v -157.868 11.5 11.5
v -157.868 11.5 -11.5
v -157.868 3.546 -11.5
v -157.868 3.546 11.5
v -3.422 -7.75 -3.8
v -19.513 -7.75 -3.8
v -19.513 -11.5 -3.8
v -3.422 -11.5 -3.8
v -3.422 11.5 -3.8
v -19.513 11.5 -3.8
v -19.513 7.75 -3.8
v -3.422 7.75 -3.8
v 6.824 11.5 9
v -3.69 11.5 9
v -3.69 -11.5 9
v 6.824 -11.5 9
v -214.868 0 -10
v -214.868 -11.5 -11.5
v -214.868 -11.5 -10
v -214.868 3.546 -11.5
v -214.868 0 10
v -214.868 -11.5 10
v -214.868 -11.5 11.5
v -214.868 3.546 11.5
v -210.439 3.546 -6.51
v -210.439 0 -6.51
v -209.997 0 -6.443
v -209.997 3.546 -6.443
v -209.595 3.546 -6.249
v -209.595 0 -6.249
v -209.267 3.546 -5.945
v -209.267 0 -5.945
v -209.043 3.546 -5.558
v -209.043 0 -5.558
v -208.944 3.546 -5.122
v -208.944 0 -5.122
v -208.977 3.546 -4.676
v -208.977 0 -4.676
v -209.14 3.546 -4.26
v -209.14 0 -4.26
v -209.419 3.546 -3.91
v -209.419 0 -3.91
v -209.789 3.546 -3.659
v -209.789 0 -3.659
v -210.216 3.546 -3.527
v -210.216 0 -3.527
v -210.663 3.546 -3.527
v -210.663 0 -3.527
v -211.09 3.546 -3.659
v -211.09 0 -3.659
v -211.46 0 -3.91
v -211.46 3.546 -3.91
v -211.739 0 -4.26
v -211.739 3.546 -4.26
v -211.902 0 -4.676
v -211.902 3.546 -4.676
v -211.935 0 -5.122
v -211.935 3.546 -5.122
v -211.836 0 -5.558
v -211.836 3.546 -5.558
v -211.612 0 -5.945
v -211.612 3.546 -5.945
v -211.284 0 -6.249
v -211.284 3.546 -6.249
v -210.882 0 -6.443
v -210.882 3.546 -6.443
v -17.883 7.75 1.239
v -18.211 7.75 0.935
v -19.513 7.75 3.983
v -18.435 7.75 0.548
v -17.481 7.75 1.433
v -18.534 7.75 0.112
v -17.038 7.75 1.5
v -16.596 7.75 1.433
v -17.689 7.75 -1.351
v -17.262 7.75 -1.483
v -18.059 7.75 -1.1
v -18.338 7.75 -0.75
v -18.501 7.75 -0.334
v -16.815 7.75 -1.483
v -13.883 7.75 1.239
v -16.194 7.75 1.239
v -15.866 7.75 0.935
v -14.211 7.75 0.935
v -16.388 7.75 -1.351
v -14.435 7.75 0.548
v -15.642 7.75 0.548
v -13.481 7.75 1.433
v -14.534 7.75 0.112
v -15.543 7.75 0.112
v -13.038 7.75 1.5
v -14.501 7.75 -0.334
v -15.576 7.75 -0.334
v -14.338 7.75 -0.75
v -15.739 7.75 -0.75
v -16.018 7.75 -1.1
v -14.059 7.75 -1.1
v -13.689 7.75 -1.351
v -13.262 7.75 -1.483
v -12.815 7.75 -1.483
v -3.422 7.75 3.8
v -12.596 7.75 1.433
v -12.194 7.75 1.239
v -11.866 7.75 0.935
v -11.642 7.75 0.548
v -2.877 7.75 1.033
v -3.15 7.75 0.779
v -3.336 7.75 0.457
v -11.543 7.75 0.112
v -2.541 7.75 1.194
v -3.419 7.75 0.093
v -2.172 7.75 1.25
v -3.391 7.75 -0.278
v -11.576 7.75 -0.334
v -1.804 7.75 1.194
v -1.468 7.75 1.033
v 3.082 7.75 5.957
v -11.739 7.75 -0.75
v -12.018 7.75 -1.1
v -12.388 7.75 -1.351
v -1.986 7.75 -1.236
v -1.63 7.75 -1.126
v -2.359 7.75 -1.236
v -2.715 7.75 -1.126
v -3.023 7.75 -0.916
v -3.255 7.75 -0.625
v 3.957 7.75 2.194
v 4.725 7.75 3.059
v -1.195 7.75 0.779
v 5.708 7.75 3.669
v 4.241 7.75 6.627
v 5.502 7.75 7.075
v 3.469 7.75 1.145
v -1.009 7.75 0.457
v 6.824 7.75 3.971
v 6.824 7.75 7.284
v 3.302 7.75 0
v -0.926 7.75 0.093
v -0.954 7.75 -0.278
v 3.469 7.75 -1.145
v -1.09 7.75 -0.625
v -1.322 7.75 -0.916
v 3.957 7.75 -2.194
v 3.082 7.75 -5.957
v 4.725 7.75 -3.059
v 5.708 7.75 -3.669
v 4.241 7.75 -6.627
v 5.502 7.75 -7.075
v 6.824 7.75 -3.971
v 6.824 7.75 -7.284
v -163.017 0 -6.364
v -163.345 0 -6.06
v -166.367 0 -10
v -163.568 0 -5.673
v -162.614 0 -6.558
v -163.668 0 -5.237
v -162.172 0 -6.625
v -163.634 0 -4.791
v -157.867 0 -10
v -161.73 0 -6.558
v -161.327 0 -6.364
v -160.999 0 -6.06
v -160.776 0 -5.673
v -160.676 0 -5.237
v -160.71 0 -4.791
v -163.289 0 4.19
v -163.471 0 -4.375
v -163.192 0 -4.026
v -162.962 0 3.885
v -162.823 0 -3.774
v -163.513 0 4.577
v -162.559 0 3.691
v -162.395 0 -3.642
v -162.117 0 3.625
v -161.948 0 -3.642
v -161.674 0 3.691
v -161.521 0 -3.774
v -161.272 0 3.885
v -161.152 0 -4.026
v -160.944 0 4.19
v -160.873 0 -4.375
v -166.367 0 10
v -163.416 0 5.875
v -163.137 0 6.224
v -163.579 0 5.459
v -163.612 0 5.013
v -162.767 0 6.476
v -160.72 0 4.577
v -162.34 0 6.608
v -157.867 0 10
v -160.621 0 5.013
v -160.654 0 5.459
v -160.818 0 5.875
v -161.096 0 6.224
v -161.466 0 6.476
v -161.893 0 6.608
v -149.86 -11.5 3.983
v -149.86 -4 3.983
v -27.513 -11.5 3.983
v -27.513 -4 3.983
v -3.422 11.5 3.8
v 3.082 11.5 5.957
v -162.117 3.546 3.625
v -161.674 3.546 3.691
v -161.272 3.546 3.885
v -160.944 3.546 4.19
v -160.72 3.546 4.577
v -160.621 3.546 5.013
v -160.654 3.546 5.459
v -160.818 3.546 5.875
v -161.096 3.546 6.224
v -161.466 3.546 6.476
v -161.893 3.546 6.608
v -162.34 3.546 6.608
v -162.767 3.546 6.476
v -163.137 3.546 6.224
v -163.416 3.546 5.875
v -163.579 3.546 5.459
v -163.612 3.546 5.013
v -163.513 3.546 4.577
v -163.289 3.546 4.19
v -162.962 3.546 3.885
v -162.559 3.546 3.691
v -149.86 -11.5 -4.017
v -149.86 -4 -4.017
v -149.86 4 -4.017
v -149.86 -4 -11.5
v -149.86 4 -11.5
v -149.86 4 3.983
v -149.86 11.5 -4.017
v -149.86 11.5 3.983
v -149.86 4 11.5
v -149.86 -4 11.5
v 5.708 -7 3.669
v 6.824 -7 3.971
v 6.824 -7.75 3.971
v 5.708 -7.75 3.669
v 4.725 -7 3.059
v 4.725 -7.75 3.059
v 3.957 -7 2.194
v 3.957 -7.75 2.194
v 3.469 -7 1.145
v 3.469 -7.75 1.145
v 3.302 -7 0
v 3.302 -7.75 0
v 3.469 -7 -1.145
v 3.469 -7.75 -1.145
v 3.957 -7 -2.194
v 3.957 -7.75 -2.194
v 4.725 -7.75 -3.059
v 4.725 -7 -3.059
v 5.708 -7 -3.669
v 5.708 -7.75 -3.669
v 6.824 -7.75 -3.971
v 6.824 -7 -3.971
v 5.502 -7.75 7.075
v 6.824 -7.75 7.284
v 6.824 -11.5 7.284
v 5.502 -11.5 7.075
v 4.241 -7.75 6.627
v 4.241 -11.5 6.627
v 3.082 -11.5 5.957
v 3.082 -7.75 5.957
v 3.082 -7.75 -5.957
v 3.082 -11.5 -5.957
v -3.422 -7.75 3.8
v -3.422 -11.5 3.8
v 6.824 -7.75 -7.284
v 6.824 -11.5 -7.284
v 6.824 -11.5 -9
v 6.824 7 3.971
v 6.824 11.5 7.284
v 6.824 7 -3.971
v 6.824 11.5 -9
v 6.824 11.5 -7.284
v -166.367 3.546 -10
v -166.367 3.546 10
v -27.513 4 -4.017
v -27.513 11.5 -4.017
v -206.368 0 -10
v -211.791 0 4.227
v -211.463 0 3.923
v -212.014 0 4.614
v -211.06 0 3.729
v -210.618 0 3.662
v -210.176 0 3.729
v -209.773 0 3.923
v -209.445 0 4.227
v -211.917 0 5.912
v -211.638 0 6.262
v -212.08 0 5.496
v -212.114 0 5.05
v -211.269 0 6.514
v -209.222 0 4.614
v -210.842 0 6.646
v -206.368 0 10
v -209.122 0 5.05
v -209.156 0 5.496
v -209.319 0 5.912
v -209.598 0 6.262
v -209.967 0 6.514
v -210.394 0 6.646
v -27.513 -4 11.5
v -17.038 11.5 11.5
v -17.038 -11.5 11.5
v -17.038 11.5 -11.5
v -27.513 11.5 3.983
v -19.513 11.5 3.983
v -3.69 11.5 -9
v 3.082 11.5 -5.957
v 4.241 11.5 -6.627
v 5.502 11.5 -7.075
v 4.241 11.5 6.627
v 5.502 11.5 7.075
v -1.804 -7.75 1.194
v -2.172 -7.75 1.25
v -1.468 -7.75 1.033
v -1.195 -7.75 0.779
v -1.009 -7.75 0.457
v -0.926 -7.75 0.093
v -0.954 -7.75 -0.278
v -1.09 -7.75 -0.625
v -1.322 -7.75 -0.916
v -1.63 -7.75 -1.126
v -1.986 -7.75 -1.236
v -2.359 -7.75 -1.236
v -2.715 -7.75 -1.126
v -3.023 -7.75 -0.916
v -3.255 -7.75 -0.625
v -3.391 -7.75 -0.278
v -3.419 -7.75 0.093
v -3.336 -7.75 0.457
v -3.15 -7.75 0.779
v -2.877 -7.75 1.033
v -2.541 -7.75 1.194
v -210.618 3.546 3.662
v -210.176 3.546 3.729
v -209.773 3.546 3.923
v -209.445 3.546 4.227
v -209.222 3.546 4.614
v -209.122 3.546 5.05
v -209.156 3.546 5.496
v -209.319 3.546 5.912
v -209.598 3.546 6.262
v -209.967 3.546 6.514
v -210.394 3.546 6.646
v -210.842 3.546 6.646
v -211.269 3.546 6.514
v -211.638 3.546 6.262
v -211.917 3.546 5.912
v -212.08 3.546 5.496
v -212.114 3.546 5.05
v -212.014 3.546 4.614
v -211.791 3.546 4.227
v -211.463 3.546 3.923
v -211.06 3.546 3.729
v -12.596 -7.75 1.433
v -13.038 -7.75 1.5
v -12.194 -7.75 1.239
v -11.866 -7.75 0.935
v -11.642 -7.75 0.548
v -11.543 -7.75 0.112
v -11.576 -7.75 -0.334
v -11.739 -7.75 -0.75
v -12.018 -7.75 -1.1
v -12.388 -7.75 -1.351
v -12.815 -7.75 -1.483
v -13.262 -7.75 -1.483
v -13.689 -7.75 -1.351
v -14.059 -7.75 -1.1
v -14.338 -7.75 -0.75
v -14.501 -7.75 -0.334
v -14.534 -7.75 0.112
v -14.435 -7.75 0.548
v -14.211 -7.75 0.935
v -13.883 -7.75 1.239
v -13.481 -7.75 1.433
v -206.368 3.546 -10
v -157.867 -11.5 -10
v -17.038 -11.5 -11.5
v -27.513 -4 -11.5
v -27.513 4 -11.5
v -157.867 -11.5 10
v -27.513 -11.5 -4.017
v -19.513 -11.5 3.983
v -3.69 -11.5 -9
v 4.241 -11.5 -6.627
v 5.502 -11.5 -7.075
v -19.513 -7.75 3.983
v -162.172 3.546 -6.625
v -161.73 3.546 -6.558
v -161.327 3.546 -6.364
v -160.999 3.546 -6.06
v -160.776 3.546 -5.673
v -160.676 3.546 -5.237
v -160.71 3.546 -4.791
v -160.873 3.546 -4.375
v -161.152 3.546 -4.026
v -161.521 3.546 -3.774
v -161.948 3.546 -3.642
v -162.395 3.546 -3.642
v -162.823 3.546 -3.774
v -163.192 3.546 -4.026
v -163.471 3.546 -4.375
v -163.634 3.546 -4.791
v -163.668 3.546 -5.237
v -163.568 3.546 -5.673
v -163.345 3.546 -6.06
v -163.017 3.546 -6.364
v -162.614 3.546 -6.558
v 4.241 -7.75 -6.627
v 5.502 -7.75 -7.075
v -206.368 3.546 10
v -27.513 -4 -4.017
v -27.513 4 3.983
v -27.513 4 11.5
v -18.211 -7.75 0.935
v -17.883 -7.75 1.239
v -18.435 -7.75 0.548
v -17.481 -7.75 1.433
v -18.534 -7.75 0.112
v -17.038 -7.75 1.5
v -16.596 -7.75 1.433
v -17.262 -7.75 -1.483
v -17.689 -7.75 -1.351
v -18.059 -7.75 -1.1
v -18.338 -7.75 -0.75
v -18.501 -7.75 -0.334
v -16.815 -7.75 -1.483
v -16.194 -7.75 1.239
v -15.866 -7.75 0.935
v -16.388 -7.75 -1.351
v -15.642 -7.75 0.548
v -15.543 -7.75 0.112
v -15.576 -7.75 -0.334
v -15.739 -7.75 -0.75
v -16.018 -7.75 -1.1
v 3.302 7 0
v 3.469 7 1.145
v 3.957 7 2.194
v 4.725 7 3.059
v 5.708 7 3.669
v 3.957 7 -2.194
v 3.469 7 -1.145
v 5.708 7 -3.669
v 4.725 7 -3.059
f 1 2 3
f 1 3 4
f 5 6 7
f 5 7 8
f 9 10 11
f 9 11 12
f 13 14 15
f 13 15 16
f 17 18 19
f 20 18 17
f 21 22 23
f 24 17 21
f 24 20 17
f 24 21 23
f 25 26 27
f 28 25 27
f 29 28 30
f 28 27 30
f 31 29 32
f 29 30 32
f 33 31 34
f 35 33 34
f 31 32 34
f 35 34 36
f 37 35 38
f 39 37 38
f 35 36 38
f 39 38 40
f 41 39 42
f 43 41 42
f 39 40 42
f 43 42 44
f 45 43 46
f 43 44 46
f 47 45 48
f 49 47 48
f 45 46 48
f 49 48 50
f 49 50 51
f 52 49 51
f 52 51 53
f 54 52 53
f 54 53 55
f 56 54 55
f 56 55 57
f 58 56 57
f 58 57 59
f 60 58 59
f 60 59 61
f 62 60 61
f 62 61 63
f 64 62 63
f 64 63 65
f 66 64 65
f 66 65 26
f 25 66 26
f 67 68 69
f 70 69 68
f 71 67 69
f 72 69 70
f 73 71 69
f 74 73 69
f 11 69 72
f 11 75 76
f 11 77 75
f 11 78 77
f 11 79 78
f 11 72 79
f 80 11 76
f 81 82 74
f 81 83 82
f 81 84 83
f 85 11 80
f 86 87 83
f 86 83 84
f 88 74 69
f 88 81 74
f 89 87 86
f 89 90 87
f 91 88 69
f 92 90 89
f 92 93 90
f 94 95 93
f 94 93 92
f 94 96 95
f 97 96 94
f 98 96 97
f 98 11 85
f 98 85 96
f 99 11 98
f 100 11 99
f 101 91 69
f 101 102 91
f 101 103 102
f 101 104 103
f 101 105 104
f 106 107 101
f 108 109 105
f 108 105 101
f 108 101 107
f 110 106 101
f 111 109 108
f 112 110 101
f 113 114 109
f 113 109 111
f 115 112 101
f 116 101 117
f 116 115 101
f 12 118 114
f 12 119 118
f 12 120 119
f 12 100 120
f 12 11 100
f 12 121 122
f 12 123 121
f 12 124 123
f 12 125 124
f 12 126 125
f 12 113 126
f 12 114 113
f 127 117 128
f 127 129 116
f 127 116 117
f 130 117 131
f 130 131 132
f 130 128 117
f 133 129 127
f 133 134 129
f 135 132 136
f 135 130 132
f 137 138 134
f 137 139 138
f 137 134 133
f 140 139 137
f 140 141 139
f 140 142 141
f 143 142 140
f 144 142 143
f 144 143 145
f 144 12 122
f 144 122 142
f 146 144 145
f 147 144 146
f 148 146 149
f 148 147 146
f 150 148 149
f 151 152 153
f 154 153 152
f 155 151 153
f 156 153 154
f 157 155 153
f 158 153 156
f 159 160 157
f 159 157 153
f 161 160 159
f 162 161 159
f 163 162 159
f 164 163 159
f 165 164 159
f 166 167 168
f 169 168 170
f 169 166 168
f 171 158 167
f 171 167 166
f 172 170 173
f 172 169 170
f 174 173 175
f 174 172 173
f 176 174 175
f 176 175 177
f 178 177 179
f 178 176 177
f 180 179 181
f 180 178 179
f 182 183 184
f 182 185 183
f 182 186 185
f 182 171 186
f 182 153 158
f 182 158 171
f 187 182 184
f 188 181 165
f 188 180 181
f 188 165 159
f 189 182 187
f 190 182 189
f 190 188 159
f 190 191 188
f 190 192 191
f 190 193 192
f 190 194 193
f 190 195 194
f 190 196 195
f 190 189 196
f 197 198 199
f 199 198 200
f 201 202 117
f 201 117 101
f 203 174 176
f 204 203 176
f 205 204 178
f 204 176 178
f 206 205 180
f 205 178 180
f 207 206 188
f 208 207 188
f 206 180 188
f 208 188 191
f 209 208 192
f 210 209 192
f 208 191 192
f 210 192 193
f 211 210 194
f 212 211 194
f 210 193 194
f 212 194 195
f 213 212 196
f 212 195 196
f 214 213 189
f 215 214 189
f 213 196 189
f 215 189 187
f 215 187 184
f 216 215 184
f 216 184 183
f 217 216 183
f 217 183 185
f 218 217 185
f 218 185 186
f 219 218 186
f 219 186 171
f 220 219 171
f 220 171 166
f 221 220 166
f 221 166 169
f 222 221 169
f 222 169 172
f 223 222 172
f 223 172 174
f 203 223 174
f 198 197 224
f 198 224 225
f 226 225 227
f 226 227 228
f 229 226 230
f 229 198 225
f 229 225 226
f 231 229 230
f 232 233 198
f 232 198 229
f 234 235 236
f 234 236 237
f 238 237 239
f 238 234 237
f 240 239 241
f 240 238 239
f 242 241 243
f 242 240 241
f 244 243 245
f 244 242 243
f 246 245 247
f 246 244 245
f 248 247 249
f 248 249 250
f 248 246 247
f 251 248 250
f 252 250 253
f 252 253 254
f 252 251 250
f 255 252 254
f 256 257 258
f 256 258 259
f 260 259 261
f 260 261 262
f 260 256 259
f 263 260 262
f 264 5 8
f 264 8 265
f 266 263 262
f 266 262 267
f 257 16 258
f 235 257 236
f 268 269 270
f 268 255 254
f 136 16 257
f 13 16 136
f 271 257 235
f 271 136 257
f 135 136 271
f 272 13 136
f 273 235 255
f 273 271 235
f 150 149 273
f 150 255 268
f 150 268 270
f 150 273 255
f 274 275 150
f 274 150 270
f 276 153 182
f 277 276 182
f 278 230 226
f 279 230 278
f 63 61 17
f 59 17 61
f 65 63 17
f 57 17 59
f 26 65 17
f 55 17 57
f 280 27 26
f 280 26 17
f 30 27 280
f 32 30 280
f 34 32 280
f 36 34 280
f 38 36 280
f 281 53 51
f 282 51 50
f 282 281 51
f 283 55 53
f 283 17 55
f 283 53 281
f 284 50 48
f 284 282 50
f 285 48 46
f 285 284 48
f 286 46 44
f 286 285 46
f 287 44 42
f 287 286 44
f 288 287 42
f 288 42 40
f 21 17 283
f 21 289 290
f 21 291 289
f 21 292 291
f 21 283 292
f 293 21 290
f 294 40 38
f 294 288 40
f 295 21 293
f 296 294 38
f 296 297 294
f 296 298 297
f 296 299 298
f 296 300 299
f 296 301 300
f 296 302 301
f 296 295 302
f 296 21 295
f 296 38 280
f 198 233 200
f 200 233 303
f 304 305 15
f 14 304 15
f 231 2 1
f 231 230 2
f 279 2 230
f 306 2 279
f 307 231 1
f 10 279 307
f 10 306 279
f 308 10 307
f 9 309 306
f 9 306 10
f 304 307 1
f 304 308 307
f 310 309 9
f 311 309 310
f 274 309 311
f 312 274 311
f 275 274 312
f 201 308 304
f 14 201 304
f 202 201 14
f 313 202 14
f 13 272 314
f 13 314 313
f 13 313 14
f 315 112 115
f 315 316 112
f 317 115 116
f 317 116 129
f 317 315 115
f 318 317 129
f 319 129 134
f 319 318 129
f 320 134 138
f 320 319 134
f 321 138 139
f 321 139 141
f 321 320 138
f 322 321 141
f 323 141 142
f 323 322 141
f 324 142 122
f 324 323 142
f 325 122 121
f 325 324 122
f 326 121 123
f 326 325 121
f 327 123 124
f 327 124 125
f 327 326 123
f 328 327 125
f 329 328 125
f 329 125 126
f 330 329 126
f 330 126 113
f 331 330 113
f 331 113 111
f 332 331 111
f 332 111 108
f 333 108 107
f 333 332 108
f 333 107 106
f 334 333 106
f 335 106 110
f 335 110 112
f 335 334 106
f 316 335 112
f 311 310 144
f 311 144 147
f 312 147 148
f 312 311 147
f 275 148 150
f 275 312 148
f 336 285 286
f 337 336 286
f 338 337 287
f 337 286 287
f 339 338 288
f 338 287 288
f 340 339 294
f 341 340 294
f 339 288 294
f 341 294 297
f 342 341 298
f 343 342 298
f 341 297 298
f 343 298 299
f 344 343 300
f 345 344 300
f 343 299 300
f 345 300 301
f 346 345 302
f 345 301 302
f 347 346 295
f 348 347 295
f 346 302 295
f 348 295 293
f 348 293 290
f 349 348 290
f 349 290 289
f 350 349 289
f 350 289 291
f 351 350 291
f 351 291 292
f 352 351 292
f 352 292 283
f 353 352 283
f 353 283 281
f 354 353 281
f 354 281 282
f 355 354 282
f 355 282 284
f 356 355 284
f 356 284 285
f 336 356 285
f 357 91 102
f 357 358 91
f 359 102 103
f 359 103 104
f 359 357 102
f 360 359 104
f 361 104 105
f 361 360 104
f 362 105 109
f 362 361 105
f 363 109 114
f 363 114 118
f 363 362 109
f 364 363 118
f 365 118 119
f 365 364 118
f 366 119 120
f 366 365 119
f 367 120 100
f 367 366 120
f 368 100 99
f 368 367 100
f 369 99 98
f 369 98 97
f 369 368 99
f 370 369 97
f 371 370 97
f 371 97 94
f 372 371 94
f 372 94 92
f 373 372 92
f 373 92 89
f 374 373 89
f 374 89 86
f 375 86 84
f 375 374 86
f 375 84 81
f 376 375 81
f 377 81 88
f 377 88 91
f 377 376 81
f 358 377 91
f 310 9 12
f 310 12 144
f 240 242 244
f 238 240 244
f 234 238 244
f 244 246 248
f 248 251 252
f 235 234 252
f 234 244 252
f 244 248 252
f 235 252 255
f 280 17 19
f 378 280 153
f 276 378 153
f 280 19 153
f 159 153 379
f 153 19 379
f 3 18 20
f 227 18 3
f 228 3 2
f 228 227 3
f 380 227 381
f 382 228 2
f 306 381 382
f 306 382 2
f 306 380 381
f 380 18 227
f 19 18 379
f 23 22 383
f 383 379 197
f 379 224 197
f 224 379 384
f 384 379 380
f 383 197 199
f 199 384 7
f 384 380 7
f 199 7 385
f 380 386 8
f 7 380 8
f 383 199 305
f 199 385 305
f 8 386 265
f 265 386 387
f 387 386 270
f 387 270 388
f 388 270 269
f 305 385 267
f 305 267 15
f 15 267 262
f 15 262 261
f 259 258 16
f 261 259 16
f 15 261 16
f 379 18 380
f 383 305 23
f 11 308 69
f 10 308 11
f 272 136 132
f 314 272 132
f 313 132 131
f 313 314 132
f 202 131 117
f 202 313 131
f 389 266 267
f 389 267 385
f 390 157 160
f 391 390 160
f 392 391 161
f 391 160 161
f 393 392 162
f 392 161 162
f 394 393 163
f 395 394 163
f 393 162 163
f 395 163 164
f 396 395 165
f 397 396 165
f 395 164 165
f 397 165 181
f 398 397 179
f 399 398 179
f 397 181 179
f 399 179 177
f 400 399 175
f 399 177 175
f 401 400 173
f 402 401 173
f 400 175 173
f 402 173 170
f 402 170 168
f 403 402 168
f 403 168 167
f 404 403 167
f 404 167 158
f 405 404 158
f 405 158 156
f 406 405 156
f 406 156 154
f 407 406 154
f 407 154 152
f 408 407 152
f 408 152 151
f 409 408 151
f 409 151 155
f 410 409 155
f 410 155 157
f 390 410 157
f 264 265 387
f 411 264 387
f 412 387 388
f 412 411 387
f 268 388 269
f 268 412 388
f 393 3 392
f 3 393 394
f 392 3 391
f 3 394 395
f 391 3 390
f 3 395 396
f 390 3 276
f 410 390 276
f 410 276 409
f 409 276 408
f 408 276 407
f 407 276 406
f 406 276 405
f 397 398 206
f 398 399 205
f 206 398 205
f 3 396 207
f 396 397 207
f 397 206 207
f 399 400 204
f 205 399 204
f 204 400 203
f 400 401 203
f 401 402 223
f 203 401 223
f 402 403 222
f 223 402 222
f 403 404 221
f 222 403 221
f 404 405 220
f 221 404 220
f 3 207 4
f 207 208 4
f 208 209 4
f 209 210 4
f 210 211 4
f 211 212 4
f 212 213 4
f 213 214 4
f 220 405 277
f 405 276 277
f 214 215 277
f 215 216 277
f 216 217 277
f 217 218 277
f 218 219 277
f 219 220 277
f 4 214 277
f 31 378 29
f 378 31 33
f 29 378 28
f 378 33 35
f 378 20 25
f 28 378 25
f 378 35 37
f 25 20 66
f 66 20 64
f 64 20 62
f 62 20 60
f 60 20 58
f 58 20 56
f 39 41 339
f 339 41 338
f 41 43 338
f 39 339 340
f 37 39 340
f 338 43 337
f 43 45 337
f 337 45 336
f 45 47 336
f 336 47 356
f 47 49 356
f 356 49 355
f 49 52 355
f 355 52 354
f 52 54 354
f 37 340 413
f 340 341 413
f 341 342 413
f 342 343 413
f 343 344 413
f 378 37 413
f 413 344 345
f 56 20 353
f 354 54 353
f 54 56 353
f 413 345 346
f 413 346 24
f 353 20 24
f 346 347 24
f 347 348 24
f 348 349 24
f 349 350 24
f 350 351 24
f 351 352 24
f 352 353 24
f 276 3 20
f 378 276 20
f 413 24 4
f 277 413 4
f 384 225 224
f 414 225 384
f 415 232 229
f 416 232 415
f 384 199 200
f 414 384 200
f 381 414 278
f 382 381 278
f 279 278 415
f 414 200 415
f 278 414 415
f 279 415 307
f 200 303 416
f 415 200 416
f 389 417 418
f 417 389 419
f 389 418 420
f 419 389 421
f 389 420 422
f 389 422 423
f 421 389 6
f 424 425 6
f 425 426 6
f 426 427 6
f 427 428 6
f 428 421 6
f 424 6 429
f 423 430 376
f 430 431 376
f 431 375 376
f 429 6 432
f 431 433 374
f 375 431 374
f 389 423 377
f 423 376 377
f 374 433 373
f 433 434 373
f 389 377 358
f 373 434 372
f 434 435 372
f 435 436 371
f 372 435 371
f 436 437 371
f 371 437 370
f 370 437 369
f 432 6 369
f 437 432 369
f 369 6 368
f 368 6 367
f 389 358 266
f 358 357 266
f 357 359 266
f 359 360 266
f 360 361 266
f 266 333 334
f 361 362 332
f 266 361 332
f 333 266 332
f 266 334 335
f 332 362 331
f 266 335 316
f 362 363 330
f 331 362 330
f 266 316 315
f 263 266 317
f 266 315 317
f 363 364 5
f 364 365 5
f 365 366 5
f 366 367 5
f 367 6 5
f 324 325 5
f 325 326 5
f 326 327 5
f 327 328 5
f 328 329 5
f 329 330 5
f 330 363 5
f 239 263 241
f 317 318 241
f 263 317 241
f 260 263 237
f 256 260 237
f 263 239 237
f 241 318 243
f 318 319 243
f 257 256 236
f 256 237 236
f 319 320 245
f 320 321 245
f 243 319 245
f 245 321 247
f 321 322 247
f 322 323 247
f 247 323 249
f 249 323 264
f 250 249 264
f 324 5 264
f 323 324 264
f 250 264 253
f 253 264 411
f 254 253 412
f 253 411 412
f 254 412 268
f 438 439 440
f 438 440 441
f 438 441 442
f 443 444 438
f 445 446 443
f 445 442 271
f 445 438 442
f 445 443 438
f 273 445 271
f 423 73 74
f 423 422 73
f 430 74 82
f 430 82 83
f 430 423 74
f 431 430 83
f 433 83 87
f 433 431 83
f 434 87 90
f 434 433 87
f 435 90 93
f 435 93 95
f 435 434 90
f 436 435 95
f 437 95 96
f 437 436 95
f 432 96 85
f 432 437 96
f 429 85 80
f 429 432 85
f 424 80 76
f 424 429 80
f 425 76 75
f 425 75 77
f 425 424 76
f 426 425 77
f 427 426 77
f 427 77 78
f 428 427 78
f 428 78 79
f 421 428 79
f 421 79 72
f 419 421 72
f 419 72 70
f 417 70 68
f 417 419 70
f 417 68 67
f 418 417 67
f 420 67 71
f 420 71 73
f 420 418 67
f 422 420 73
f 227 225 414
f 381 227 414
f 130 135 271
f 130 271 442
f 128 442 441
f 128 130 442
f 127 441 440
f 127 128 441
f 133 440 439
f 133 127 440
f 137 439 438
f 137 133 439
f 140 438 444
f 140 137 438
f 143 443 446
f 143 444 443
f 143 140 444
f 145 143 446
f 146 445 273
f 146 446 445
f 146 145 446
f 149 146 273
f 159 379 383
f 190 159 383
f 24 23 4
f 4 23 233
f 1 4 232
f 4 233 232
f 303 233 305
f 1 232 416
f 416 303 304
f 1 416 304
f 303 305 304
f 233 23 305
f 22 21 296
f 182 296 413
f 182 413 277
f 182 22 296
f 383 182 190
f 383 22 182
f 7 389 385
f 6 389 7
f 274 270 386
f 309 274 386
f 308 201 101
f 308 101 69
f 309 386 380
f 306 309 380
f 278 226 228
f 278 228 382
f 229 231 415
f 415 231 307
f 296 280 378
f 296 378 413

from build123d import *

# Parameters (mm, degrees)
BOSS_EXTRUDE1_DEPTH = 11.5
SKETCH1_13_R        = 1.5
SKETCH1_13_R_2      = 1.25
BOSS_EXTRUDE2_DEPTH = 7.75
BOSS_EXTRUDE3_DEPTH = 7
SKETCH2_W           = 23
SKETCH2_H           = 23
BOSS_EXTRUDE4_DEPTH = 190
CUT_EXTRUDE1_DEPTH  = 57
SKETCH8_W           = 57.001402056
SKETCH8_H           = 19.999995634
CUT_EXTRUDE5_DEPTH  = 11.5
SKETCH8_6_W         = 40.001402056
SKETCH8_6_H         = 19.999995634
SKETCH8_6_R         = 1.5
CUT_EXTRUDE7_DEPTH  = 15.55
SKETCH11_W          = 122.346056991
SKETCH11_H          = 8
CUT_EXTRUDE8_DEPTH  = 85.55
SKETCH10_W          = 122.346056991
SKETCH10_H          = 8
CUT_EXTRUDE9_DEPTH  = 105.55


with BuildPart() as part:
    # Sketch1 → Boss-Extrude1 (new, symmetric)
    with BuildSketch(Plane(origin=(0, 0, 0), x_dir=(1, 0, 0), z_dir=(0, 1, 0))):
        with BuildLine():
            Line((6.824314586, 7.284360201), (6.824314586, 9.00020274))
            Line((6.824314586, 9.00020274), (-3.690467309, 9.00020274))
            Line((-3.690467309, 9.00020274), (-17.038497557, 11.5))
            Line((-17.038497557, 11.5), (-24.867971487, 11.5))
            Line((-24.867971487, 11.5), (-24.867971487, -11.5))
            Line((-24.867971487, -11.5), (-17.038497557, -11.5))
            Line((-17.038497557, -11.5), (-3.690467309, -9.00020274))
            Line((-3.690467309, -9.00020274), (6.824314586, -9.00020274))
            Line((6.824314586, -9.00020274), (6.824314586, -7.284360201))
            ThreePointArc((6.824314586, -7.284360201), (4.861171432, -6.879883717), (3.082035449, -5.956732906))
            Line((3.082035449, -5.956732906), (-3.422402494, -3.8))
            Line((-3.422402494, -3.8), (-19.513448301, -3.98254267))
            Line((-19.513448301, -3.98254267), (-19.513448301, 3.8))
            Line((-19.513448301, 3.8), (-3.422402494, 3.8))
            Line((-3.422402494, 3.8), (3.082035449, 5.956732906))
            ThreePointArc((3.082035449, 5.956732906), (4.861171432, 6.879883717), (6.824314586, 7.284360201))
        make_face()
    extrude(amount=BOSS_EXTRUDE1_DEPTH, both=True)

    # Sketch1<13> → Boss-Extrude2 (add, symmetric)
    with BuildSketch(Plane(origin=(0, 0, 0), x_dir=(1, 0, 0), z_dir=(0, 1, 0))):
        with BuildLine():
            Line((6.824314586, 3.971385595), (6.824314586, 7.284360201))
            ThreePointArc((6.824314586, 7.284360201), (4.861171432, 6.879883717), (3.082035449, 5.956732906))
            Line((3.082035449, 5.956732906), (-3.422402494, 3.8))
            Line((-3.422402494, 3.8), (-19.513448301, 3.8))
            Line((-19.513448301, 3.8), (-19.513448301, -3.98254267))
            Line((-19.513448301, -3.98254267), (-3.422402494, -3.8))
            Line((-3.422402494, -3.8), (3.082035449, -5.956732906))
            ThreePointArc((3.082035449, -5.956732906), (4.861171432, -6.879883717), (6.824314586, -7.284360201))
            Line((6.824314586, -7.284360201), (6.824314586, -3.971385595))
            ThreePointArc((6.824314586, -3.971385595), (3.301909035, 0), (6.824314586, 3.971385595))
        make_face()
        with Locations((-17.038497557, 0)):
            Circle(SKETCH1_13_R, mode=Mode.SUBTRACT)
        with Locations((-13.038497557, 0)):
            Circle(SKETCH1_13_R, mode=Mode.SUBTRACT)
        with Locations((-2.172402494, 0)):
            Circle(SKETCH1_13_R_2, mode=Mode.SUBTRACT)
    extrude(amount=BOSS_EXTRUDE2_DEPTH, both=True)

    # Sketch1<14> → Boss-Extrude3 (add, symmetric)
    with BuildSketch(Plane(origin=(0, 0, 0), x_dir=(1, 0, 0), z_dir=(0, 1, 0))):
        with BuildLine():
            Line((6.824314586, -3.971385595), (6.824314586, 3.971385595))
            ThreePointArc((6.824314586, 3.971385595), (3.301909035, 0), (6.824314586, -3.971385595))
        make_face()
    extrude(amount=BOSS_EXTRUDE3_DEPTH, both=True)

    # Sketch2 → Boss-Extrude4 (add)
    with BuildSketch(Plane.ZY.offset(24.867971487)):
        Rectangle(SKETCH2_W, SKETCH2_H)
    extrude(amount=BOSS_EXTRUDE4_DEPTH)

    # Sketch9 → Cut-Extrude1 (cut)
    with BuildSketch(Plane.ZY.offset(214.867971487)):
        Polygon((-12.112347762, 3.545517382), (11.5, 3.545517382), (11.5, 11.5), (-11.5, 11.5), (-12.112347762, 11.5), align=None)
    extrude(amount=-CUT_EXTRUDE1_DEPTH, mode=Mode.SUBTRACT)

    # Sketch8 → Cut-Extrude5 (cut)
    with BuildSketch(Plane.XZ.offset(11.5)):
        with Locations((-186.367270459, 2.183e-06)):
            Rectangle(SKETCH8_W, SKETCH8_H)
    extrude(amount=-CUT_EXTRUDE5_DEPTH, mode=Mode.SUBTRACT)

    # Sketch8<6> → Cut-Extrude7 (cut)
    with BuildSketch(Plane.XZ.offset(11.5)):
        with Locations((-186.367270459, 2.183e-06)):
            Rectangle(SKETCH8_6_W, SKETCH8_6_H)
        with Locations((-210.617971487, 5.162283196)):
            Circle(SKETCH8_6_R)
        with Locations((-210.439498104, -5.010019091)):
            Circle(SKETCH8_6_R)
        with Locations((-162.116569431, 5.124855295)):
            Circle(SKETCH8_6_R)
        with Locations((-162.171918624, -5.125135232)):
            Circle(SKETCH8_6_R)
    extrude(amount=-CUT_EXTRUDE7_DEPTH, mode=Mode.SUBTRACT)

    # Sketch11 → Cut-Extrude8 (cut)
    with BuildSketch(Plane.XY.offset(11.5)):
        with Locations((-88.686476797, 0)):
            Rectangle(SKETCH11_W, SKETCH11_H)
    extrude(amount=-CUT_EXTRUDE8_DEPTH, mode=Mode.SUBTRACT)

    # Sketch10 → Cut-Extrude9 (cut)
    with BuildSketch(Plane(origin=(0, 11.5, 0), x_dir=(1, 0, 0), z_dir=(0, 1, 0))):
        with Locations((-88.686476797, 0.01745733)):
            Rectangle(SKETCH10_W, SKETCH10_H)
    extrude(amount=-CUT_EXTRUDE9_DEPTH, mode=Mode.SUBTRACT)


solid = part.part
